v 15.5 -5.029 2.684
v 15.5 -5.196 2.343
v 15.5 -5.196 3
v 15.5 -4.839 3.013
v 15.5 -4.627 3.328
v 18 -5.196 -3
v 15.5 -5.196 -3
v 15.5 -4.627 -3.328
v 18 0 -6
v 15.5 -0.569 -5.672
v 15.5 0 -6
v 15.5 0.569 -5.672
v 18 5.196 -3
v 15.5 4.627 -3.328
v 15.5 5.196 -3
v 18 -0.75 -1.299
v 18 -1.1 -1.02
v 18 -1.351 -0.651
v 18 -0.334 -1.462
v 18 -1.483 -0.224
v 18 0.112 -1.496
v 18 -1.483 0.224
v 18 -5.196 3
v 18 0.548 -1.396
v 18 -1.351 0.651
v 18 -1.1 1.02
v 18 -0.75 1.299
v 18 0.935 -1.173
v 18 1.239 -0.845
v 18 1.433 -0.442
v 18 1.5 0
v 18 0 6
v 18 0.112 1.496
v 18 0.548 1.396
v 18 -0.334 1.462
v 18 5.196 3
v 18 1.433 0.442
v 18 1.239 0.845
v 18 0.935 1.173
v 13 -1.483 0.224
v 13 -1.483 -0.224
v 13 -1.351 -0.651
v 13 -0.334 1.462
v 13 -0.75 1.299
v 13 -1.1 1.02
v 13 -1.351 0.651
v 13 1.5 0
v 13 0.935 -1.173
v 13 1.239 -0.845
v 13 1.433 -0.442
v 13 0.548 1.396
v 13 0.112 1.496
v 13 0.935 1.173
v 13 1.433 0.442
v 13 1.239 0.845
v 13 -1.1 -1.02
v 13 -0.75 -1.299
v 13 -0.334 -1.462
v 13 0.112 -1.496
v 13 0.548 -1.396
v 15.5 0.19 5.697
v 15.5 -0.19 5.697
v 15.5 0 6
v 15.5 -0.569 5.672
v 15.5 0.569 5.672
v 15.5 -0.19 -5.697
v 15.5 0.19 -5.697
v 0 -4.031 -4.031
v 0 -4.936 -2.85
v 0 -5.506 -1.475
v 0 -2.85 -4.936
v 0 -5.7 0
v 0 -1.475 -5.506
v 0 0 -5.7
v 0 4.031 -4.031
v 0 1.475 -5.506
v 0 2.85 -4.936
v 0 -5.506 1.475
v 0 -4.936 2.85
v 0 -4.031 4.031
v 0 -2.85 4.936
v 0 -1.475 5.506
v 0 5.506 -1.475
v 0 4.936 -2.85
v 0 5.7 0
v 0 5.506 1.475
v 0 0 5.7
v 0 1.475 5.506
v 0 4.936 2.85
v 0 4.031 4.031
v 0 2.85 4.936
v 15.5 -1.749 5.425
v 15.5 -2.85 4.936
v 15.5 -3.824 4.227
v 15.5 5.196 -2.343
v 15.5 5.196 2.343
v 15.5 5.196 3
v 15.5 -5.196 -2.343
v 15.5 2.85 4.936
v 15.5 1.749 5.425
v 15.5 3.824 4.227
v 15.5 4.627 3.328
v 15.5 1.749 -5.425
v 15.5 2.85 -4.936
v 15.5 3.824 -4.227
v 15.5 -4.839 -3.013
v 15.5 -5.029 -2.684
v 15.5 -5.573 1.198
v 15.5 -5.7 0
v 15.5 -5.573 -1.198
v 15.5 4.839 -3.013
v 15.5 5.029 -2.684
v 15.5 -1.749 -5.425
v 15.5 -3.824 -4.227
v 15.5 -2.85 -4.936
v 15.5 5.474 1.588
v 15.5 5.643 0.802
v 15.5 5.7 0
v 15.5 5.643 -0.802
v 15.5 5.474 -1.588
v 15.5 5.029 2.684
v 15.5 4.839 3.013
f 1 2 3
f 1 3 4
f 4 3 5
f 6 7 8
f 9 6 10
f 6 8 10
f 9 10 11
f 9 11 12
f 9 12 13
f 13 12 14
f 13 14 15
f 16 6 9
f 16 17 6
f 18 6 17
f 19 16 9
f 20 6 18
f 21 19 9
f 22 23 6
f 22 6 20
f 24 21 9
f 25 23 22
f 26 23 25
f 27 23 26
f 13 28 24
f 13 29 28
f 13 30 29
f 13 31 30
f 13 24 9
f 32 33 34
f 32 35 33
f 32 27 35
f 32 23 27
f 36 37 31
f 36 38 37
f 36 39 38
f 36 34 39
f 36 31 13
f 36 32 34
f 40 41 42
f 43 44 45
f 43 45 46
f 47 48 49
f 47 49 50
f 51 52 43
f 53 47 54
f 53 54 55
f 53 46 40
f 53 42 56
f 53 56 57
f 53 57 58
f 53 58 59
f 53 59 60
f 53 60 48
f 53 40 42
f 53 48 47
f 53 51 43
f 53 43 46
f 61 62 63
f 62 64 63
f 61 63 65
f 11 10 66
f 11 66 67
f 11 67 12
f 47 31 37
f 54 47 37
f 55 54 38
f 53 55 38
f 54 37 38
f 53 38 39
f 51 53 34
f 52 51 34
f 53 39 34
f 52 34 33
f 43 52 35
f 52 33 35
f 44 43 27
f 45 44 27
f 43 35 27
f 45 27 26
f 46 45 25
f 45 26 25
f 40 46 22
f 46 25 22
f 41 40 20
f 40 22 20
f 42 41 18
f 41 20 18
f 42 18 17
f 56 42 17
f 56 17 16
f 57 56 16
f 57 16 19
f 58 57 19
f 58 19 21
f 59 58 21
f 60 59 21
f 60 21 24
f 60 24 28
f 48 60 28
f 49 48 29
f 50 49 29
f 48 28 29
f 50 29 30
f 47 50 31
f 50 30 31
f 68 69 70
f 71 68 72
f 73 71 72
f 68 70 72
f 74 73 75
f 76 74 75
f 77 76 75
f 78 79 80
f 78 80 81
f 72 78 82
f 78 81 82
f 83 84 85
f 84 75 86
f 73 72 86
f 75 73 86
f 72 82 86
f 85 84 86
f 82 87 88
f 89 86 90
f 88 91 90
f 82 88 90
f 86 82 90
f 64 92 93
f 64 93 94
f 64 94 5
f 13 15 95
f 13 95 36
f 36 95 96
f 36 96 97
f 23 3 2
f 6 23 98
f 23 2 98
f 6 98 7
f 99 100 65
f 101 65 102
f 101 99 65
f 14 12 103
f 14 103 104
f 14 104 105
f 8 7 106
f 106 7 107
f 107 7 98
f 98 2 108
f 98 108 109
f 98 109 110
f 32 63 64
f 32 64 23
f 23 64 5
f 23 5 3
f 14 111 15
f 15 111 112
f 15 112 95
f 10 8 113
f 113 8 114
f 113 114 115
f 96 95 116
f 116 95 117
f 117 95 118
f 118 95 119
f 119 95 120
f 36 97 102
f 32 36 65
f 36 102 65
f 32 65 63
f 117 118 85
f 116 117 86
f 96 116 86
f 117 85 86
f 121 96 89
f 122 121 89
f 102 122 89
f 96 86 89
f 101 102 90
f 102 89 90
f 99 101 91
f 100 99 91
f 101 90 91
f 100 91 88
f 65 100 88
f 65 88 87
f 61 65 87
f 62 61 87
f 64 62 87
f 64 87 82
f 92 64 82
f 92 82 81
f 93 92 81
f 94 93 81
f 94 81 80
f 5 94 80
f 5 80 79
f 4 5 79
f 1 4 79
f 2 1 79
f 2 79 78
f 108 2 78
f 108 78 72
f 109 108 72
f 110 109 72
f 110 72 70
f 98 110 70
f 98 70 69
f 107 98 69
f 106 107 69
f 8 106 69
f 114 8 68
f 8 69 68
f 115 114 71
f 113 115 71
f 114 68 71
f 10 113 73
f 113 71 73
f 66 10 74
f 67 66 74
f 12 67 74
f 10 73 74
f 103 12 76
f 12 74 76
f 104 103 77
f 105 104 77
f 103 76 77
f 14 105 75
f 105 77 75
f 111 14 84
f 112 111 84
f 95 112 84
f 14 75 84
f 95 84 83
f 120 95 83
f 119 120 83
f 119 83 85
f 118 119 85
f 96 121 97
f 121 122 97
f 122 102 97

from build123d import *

# Parameters (mm, degrees)
SKETCH_R     = 5.7
PAD_DEPTH    = 15.5
PAD001_DEPTH = 2.5
SKETCH002_R  = 1.5
POCKET_DEPTH = 5


with BuildPart() as part:
    # Sketch → Pad (new body)
    with BuildSketch(Plane.YZ):
        Circle(SKETCH_R)
    extrude(amount=PAD_DEPTH)

    # Sketch001 (on Face3 of Pad) → Pad001 (join)
    with BuildSketch(Plane.YZ.offset(15.5)):
        Polygon((0, 6), (-5.196152, 3), (-5.196152, -3), (0, -6), (5.196152, -3), (5.196152, 3), align=None)
    extrude(amount=PAD001_DEPTH)

    # Sketch002 (on Face21 of Pad001) → Pocket (cut)
    with BuildSketch(Plane.YZ.offset(18)):
        Circle(SKETCH002_R)
    extrude(amount=-POCKET_DEPTH, mode=Mode.SUBTRACT)


solid = part.part
